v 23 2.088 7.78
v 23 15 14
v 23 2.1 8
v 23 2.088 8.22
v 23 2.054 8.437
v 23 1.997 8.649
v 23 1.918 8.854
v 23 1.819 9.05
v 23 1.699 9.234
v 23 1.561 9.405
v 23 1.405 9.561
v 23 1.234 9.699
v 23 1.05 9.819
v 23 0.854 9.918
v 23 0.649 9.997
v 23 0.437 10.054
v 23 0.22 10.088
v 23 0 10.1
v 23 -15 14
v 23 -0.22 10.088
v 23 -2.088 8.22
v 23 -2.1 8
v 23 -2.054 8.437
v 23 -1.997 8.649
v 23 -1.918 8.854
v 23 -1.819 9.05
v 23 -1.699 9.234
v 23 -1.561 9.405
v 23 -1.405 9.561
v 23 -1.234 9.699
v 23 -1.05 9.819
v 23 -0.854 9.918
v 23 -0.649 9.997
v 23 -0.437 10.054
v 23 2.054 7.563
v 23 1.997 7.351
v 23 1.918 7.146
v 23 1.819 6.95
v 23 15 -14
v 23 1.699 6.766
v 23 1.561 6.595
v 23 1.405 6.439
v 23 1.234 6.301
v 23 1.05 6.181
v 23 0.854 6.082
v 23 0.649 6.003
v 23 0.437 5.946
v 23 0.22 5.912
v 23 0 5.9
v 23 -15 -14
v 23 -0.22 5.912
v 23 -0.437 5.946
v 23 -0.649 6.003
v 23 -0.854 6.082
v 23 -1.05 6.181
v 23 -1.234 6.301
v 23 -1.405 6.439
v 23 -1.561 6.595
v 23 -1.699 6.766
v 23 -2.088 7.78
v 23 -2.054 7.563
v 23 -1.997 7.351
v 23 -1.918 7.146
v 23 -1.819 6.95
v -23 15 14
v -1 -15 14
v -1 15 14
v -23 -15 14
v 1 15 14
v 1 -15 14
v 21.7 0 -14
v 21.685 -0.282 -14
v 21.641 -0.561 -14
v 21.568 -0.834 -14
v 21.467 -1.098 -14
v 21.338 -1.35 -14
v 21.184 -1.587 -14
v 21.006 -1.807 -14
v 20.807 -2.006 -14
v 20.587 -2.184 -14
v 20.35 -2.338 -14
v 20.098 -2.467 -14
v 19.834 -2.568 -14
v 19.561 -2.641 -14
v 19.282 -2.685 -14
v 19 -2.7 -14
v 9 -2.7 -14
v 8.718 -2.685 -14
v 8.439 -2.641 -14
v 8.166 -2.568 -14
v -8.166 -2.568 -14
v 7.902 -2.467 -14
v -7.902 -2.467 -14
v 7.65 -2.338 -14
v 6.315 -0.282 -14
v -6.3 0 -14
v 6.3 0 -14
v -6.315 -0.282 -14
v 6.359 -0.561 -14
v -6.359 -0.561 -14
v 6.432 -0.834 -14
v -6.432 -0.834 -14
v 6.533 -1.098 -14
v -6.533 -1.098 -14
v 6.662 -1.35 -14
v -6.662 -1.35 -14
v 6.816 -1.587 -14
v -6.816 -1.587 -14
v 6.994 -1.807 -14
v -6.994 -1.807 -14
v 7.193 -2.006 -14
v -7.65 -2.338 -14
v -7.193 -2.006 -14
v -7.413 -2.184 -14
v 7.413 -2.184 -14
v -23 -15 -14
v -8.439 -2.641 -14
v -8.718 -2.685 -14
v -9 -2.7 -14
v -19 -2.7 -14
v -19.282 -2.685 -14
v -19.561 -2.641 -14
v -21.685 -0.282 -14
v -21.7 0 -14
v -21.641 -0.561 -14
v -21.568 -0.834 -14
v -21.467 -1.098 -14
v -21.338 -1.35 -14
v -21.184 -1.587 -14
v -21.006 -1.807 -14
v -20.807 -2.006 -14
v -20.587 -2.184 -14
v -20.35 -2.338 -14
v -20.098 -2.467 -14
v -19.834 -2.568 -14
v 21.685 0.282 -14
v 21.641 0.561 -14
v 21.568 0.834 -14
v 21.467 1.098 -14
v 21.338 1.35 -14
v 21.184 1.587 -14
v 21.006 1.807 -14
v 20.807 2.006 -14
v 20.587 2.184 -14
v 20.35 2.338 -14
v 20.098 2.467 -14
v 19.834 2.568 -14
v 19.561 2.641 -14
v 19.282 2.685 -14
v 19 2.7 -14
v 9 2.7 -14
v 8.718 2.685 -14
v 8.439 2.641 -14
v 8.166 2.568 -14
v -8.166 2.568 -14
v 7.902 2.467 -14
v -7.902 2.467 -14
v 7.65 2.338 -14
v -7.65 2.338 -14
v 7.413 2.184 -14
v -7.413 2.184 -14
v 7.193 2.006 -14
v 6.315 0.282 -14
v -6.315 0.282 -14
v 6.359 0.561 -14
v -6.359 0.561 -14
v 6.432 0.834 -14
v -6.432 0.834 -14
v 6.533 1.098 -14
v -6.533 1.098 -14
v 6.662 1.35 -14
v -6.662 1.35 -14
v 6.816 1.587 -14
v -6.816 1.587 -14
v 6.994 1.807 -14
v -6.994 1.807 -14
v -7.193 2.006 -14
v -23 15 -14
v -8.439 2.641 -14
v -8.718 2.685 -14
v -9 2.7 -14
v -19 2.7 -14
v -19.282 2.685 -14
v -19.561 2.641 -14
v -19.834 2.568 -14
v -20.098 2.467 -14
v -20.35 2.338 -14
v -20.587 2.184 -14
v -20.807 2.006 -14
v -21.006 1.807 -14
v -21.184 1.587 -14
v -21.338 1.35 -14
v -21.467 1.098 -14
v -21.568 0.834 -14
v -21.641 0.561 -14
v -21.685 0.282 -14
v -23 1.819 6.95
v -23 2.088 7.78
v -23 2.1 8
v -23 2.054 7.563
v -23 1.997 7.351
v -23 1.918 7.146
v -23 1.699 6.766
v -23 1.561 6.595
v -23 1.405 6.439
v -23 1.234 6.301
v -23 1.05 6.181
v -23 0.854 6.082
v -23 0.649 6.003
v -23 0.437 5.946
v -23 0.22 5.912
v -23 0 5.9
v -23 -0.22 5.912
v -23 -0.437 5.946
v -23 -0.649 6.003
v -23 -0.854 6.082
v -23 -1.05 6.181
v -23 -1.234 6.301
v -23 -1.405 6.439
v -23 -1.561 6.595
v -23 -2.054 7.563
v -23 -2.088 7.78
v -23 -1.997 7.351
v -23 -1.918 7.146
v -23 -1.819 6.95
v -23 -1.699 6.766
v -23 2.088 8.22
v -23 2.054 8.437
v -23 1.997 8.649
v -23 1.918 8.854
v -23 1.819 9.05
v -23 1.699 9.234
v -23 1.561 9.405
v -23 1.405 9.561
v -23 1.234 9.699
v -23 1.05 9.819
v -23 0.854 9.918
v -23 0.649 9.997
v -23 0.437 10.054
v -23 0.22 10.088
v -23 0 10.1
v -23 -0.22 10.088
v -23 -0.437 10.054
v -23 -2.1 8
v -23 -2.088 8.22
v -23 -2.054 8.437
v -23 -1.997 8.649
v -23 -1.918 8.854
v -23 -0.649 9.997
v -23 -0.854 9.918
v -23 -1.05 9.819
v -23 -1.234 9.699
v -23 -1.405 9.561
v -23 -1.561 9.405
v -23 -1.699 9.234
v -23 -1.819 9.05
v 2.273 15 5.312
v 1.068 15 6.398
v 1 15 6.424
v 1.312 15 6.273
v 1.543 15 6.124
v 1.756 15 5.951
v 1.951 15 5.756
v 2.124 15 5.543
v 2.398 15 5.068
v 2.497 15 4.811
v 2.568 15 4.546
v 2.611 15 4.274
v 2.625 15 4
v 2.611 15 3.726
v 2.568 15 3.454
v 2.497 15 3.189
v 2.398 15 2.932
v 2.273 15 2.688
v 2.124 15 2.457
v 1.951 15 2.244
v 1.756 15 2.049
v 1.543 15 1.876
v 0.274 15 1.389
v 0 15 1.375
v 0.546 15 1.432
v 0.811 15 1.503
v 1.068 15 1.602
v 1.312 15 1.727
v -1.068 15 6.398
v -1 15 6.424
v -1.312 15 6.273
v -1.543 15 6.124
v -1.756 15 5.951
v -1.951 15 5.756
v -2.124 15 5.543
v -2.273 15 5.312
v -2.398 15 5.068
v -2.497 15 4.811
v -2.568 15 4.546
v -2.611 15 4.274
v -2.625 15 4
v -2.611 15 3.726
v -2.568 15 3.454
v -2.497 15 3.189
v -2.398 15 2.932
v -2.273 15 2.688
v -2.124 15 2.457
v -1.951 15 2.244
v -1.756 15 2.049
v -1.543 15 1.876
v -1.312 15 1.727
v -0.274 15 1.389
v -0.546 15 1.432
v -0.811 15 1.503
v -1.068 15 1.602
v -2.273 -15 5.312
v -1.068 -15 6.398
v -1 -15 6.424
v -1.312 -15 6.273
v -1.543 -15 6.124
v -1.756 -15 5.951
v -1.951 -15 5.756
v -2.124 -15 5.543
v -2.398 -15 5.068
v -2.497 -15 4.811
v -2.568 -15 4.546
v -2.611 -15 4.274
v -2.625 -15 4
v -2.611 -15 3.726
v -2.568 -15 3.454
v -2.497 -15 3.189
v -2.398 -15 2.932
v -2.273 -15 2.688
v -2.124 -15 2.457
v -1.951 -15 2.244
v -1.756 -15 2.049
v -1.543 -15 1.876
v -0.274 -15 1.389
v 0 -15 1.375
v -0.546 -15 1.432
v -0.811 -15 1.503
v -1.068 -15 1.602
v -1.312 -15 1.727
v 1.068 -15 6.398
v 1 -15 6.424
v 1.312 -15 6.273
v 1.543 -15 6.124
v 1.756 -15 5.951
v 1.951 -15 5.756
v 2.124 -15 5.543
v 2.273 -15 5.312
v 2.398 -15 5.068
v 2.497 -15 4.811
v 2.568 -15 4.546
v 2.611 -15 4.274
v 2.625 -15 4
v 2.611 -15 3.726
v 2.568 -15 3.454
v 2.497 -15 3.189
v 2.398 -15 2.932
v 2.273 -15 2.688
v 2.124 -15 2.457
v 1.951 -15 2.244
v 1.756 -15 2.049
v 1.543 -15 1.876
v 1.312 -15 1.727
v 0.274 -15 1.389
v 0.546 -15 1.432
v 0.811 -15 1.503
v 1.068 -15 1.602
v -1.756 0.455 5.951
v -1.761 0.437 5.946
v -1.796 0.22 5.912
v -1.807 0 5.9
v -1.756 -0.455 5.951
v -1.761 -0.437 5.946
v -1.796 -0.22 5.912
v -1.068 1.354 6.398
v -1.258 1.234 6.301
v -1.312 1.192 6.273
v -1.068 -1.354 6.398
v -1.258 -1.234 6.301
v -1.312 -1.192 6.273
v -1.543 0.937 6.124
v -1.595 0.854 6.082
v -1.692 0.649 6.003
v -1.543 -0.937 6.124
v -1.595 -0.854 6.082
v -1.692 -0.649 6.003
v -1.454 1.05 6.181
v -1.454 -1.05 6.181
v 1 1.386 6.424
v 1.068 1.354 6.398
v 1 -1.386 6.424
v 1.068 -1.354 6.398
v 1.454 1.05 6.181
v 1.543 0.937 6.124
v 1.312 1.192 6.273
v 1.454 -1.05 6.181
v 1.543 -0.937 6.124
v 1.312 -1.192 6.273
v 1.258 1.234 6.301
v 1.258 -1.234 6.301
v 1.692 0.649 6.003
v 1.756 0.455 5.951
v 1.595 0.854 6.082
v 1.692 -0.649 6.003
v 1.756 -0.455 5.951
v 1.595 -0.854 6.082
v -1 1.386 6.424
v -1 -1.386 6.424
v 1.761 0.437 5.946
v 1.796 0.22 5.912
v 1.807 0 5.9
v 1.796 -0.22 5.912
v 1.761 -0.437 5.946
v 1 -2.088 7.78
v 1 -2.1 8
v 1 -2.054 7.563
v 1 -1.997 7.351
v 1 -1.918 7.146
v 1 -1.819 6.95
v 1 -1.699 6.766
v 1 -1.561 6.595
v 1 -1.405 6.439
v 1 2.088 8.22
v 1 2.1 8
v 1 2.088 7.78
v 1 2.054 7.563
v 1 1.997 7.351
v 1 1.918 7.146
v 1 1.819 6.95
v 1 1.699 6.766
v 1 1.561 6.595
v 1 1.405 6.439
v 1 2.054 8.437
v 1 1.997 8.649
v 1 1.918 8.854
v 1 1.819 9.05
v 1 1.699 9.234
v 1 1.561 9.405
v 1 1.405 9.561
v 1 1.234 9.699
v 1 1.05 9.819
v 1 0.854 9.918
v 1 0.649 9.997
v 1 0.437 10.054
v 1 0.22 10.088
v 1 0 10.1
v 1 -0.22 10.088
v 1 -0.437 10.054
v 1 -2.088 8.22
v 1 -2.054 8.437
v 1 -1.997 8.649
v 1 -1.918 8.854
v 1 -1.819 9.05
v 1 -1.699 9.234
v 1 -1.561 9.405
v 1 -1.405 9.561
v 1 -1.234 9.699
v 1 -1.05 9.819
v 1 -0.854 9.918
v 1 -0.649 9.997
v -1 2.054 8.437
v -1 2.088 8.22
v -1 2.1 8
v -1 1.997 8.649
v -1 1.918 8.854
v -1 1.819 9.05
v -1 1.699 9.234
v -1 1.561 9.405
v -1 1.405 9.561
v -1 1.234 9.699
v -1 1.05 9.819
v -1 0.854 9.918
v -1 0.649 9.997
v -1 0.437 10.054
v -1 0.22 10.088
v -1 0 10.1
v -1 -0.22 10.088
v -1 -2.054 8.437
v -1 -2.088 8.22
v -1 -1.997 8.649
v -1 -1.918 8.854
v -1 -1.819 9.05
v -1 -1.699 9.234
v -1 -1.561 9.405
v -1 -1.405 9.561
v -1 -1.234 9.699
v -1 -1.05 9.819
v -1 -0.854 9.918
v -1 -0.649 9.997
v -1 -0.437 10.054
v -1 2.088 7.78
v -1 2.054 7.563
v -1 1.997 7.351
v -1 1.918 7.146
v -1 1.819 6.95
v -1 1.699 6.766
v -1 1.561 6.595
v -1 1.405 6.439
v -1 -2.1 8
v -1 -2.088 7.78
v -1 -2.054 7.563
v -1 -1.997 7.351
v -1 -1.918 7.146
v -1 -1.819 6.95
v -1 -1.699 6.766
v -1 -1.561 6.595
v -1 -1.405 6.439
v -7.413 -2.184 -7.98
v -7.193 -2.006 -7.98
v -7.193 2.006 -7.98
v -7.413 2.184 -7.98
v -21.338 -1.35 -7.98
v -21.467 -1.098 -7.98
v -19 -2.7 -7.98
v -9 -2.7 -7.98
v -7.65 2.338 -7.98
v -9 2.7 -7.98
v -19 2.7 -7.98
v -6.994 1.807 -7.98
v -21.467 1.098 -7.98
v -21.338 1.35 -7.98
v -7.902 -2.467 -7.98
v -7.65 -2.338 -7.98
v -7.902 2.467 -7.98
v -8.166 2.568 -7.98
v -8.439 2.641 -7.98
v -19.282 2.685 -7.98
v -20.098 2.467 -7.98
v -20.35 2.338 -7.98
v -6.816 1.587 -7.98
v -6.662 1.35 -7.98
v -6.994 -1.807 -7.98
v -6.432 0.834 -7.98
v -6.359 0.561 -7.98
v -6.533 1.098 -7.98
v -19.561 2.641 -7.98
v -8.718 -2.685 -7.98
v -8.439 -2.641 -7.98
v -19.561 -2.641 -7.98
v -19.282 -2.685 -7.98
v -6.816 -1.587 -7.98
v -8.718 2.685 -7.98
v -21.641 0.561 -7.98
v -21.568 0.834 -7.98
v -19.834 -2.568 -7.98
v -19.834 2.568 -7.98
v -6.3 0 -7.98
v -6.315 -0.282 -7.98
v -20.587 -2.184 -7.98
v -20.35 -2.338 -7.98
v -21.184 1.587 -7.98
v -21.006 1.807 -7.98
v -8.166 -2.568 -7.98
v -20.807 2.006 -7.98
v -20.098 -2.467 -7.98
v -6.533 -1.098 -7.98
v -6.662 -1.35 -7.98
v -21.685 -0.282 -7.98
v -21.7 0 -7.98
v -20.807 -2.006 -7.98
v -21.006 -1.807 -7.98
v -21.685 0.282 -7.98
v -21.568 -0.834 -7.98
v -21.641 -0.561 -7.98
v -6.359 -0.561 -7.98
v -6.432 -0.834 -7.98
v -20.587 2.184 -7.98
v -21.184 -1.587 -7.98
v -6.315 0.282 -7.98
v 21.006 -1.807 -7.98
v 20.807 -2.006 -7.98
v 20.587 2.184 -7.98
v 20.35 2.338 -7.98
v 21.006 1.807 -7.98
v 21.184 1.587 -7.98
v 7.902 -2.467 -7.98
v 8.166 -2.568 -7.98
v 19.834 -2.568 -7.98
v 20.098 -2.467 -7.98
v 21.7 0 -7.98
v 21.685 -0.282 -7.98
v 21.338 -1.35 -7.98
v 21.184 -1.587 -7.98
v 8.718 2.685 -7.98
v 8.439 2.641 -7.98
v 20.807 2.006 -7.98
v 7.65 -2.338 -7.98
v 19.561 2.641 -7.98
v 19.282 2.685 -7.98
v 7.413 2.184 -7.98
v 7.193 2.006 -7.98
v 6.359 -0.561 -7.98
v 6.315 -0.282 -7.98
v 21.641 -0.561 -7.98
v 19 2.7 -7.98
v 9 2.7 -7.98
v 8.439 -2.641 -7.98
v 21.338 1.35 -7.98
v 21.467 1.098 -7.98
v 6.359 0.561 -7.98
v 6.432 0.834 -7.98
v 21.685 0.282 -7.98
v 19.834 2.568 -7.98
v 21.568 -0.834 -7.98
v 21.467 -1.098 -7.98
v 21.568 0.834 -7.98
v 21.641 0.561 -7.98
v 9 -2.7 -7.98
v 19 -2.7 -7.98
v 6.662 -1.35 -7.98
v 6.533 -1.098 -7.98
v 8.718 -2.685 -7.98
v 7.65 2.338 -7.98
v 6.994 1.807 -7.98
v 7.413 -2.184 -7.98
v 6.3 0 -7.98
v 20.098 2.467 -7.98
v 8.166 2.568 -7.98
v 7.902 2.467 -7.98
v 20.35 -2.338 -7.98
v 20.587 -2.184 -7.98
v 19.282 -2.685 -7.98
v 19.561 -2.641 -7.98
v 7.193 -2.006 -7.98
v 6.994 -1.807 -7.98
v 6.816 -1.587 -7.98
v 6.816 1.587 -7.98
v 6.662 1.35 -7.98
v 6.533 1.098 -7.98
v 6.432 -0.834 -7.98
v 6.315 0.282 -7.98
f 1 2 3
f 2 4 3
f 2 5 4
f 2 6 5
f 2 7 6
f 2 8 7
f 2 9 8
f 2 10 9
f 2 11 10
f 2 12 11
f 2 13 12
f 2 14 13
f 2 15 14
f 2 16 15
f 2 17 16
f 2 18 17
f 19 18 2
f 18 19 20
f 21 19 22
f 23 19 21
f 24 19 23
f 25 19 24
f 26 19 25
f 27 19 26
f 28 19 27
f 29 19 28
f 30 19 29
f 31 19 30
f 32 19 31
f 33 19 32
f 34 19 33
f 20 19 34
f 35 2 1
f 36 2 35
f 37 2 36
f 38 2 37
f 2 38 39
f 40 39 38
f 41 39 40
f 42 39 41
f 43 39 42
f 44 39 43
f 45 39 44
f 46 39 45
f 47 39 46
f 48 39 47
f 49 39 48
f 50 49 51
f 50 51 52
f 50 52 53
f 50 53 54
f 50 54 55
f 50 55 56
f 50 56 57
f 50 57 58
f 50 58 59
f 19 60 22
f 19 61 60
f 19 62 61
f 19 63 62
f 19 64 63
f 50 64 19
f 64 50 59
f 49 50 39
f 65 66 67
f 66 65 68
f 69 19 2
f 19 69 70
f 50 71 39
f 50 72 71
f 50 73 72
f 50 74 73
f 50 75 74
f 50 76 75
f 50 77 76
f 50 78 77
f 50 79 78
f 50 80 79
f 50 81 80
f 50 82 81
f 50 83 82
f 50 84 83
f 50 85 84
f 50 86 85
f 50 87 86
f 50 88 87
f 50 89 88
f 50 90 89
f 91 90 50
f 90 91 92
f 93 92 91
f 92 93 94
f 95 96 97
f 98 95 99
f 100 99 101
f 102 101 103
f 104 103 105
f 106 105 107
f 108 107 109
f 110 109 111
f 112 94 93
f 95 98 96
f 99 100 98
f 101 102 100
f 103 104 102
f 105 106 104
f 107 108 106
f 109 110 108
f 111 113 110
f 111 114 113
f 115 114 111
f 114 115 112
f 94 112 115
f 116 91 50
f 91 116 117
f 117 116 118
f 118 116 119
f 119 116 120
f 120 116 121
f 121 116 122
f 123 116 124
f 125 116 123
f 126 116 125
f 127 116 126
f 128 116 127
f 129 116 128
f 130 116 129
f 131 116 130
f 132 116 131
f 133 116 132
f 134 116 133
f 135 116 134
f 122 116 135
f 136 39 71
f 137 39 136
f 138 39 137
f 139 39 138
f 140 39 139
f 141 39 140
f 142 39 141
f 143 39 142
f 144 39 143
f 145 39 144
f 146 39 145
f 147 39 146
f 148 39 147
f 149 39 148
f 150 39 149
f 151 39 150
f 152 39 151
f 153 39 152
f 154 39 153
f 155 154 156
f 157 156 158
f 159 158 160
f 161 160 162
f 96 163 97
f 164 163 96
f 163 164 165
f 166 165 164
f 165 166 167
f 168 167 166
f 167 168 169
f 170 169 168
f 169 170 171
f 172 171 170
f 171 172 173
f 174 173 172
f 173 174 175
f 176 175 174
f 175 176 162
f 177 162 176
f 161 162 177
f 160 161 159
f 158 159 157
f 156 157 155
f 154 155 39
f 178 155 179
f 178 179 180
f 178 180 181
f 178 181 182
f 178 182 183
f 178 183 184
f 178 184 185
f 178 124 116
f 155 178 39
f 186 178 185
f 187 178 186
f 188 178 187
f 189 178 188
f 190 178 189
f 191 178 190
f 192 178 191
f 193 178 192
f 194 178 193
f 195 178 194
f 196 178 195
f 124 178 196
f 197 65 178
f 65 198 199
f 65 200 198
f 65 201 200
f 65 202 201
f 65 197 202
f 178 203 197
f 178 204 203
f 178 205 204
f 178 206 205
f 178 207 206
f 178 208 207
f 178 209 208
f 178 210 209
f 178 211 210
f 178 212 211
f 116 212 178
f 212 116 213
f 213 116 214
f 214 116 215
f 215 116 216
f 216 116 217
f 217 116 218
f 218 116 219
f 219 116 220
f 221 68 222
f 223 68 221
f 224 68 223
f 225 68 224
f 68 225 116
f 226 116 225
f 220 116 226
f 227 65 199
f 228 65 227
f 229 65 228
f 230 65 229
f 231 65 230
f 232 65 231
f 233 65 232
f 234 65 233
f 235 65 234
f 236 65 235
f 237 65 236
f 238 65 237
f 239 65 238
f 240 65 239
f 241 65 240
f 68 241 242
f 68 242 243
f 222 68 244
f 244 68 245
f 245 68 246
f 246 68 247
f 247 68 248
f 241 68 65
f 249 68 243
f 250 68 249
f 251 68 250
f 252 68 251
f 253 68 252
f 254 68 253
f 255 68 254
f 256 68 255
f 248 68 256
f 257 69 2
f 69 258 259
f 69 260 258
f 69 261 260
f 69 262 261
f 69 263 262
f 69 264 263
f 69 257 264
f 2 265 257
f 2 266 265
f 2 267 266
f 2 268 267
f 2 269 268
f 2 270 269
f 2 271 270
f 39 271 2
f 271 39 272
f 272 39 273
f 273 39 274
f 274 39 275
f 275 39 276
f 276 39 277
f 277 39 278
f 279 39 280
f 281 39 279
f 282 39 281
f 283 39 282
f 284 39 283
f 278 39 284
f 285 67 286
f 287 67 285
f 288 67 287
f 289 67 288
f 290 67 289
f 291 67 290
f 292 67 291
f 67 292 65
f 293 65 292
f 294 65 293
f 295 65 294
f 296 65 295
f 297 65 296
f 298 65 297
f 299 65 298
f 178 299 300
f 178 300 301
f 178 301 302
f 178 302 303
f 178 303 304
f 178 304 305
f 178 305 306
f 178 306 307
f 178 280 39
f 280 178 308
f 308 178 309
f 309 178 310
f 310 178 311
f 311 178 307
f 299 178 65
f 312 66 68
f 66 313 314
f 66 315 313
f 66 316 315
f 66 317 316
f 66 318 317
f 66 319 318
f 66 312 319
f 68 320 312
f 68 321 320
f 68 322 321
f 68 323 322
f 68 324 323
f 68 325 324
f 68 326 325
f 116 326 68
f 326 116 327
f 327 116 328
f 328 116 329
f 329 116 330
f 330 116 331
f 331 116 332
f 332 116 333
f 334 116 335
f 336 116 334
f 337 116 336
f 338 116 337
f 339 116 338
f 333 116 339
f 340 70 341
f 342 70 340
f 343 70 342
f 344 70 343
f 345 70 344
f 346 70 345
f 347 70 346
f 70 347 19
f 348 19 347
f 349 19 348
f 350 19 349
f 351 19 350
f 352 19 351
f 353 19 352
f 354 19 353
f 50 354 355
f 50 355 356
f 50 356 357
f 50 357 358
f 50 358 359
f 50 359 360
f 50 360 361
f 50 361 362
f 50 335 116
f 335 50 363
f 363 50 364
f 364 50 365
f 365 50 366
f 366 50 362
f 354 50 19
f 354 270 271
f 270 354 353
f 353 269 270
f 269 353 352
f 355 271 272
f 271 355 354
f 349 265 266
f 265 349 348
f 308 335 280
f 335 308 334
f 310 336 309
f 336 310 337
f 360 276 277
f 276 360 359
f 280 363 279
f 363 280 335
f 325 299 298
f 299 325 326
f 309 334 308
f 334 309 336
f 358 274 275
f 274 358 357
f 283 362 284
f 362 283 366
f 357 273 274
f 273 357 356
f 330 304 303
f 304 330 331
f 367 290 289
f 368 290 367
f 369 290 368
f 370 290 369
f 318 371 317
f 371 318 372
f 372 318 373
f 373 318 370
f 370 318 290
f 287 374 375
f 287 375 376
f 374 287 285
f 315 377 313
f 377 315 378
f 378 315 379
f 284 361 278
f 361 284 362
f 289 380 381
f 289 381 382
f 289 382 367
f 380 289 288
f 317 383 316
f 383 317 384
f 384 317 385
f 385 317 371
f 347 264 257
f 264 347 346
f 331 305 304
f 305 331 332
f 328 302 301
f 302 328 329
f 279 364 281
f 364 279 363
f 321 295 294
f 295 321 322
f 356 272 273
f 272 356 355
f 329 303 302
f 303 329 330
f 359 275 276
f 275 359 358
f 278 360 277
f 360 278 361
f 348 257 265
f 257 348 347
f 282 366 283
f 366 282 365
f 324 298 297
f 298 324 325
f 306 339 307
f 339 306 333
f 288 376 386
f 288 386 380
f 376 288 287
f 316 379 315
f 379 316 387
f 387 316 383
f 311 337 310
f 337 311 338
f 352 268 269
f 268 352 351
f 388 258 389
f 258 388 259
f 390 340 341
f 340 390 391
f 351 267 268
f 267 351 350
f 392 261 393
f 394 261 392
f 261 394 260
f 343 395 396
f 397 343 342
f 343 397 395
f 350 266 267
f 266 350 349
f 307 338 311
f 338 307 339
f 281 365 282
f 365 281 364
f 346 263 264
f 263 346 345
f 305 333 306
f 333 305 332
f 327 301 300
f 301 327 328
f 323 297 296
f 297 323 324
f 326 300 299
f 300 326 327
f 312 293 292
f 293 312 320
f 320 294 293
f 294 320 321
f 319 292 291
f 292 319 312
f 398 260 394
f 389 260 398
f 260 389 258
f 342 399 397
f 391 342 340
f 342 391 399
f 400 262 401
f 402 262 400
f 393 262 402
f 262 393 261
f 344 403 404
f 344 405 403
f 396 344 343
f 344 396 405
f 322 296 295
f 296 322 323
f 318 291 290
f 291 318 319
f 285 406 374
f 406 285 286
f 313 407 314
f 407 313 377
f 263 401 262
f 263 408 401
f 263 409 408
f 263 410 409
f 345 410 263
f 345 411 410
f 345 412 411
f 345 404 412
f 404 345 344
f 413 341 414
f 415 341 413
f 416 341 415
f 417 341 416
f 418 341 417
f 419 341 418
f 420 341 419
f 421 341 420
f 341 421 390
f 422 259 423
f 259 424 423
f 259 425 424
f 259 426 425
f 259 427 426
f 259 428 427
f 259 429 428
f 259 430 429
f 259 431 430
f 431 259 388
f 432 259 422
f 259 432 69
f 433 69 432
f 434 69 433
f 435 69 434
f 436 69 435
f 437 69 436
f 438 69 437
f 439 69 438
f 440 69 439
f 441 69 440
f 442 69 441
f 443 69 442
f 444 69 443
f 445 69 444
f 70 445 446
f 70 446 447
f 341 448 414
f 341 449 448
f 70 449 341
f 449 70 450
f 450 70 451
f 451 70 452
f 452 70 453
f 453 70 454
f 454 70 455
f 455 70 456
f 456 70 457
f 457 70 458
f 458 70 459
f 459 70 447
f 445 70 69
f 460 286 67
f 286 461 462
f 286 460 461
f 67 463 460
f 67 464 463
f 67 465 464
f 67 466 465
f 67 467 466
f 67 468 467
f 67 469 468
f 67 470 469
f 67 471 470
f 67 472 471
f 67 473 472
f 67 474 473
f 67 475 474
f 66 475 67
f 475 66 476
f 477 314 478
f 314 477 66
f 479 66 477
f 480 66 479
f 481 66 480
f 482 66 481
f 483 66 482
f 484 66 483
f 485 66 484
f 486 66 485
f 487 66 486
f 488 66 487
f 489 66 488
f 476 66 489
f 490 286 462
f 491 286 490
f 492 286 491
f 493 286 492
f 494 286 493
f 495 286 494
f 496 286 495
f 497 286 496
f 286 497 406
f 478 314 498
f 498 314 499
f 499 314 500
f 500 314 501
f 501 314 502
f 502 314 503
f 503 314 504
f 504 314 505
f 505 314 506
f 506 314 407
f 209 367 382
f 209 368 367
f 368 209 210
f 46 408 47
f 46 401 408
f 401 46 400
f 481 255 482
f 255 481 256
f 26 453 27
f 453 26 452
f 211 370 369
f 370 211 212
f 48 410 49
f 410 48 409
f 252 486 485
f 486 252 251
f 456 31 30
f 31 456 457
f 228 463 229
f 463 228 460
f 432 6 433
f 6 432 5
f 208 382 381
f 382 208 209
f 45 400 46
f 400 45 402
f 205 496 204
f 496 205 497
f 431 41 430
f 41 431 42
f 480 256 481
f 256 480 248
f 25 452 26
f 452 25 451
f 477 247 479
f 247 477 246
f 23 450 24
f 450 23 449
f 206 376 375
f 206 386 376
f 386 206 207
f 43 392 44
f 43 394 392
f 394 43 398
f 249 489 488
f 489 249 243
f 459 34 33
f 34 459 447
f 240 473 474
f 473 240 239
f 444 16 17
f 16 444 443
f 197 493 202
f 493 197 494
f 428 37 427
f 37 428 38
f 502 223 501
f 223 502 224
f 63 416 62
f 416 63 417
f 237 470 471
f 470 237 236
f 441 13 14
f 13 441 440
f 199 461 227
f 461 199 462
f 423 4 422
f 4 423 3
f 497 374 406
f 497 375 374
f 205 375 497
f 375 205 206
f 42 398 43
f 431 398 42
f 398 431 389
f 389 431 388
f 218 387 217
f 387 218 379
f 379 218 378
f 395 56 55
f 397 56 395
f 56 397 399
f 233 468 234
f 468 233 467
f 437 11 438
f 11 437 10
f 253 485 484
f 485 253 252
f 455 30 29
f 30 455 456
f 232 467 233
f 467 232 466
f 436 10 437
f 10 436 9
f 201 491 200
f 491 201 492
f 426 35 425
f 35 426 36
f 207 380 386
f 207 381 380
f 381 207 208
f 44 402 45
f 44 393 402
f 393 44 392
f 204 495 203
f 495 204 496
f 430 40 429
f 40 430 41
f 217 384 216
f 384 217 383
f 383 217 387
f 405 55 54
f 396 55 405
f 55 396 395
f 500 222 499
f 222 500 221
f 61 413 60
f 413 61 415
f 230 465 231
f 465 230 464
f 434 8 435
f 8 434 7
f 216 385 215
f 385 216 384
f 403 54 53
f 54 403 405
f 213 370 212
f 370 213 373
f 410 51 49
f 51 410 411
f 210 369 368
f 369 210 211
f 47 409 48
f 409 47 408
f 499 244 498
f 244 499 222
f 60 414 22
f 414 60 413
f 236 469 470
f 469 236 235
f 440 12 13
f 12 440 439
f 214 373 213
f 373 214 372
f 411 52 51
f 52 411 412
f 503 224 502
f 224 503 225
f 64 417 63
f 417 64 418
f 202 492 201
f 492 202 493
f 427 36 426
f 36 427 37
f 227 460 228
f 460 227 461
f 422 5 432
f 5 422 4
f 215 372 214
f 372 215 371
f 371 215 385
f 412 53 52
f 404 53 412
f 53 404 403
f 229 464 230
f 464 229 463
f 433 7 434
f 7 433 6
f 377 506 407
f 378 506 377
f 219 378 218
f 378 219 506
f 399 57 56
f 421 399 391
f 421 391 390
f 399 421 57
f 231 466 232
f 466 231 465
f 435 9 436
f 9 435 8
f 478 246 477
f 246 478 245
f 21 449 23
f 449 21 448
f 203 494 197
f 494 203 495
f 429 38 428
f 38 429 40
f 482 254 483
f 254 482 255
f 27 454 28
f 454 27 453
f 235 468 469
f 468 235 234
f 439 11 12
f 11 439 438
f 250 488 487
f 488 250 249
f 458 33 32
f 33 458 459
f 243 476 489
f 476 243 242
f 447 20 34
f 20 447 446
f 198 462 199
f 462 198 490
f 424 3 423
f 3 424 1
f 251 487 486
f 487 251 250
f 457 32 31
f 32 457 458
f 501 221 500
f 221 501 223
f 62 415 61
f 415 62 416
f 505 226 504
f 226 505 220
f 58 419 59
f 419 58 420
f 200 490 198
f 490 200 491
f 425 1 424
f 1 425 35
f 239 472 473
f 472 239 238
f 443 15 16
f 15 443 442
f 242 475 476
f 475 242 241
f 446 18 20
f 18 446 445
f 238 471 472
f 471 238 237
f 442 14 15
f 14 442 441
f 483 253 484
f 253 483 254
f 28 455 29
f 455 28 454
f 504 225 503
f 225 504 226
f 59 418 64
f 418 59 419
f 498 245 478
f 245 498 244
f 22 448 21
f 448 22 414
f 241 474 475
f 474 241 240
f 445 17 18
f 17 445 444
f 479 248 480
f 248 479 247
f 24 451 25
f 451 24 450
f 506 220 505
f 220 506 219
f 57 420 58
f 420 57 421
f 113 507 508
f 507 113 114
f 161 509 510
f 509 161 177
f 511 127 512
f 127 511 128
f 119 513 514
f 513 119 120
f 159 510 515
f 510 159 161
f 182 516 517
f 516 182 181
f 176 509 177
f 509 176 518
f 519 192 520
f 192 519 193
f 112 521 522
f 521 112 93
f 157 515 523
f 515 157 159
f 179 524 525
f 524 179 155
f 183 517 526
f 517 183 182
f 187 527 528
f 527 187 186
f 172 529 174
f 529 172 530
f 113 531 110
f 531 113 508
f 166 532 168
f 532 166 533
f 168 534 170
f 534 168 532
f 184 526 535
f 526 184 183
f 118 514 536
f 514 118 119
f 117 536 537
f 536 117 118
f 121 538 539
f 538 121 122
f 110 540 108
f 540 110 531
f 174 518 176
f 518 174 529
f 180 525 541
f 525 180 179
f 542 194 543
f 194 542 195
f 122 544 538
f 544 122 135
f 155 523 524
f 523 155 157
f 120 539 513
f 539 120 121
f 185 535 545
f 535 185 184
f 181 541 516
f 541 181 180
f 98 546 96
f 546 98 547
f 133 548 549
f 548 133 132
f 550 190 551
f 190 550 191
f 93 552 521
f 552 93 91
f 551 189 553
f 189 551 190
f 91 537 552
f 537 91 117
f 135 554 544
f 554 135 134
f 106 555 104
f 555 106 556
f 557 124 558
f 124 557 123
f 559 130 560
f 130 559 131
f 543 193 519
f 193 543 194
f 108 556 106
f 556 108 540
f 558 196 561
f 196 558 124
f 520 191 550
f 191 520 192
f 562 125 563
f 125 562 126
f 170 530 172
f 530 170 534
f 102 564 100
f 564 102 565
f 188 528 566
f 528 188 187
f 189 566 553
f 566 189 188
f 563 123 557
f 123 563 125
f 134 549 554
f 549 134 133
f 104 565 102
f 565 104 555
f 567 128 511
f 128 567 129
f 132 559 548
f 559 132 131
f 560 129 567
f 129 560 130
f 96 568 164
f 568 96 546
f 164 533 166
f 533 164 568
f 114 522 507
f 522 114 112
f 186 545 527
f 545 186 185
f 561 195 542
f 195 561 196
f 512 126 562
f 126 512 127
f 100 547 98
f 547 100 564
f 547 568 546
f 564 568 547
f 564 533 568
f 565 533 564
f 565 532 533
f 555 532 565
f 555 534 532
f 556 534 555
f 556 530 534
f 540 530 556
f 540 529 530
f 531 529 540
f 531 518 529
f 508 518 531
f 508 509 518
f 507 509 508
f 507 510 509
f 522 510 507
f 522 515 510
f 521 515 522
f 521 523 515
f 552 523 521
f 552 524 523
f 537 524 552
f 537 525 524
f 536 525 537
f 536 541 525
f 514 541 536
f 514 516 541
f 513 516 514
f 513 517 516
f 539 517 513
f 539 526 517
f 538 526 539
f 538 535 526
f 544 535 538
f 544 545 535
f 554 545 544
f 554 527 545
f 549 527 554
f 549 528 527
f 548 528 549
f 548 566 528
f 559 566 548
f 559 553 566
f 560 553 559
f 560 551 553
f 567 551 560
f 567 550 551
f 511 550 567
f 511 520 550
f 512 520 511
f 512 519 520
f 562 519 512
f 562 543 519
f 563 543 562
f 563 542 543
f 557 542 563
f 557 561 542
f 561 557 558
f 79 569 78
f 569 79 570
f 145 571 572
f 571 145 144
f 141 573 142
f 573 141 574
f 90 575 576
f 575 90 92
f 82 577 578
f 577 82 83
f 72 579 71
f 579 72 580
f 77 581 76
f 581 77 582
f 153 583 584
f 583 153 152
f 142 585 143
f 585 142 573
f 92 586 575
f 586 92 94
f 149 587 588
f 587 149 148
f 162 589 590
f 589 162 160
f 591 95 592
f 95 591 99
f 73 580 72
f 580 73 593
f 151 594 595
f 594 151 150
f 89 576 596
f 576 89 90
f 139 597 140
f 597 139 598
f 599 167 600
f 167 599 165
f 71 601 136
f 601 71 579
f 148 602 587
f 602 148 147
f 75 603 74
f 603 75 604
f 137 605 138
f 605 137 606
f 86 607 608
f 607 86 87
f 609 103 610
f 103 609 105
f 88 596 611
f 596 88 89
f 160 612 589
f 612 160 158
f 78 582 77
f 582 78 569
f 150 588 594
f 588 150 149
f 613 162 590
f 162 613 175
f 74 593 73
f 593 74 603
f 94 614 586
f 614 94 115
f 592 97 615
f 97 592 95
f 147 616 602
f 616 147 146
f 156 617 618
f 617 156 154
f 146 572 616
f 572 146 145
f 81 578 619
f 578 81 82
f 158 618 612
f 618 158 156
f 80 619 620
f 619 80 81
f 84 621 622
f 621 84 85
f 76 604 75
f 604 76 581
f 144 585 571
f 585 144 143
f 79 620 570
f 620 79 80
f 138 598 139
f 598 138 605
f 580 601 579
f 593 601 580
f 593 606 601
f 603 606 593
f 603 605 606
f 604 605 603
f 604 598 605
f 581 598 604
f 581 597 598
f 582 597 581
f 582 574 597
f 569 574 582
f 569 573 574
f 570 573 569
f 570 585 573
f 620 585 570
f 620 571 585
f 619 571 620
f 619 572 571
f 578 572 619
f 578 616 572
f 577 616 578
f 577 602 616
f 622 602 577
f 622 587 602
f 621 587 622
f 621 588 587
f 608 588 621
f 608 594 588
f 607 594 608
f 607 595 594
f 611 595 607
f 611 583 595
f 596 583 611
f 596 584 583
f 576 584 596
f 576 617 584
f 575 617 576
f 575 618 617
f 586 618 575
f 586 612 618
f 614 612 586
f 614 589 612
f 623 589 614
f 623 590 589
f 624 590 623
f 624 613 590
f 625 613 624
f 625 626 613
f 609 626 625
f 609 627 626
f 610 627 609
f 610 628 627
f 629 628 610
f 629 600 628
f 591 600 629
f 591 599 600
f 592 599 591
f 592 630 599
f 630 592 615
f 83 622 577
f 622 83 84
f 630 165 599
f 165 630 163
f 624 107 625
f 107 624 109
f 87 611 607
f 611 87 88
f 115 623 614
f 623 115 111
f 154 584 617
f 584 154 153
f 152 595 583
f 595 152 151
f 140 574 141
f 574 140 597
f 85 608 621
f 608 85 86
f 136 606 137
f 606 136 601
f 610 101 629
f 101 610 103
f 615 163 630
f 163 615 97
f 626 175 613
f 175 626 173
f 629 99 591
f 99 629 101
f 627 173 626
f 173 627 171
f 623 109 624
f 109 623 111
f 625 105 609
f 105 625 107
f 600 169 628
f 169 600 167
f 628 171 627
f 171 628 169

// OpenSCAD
// 5 mm shaft pedestal: clamp pedestal for a horizontal precision shaft.
$fn = 60;
eps = 0.02;
shaft_d = 5;
body_l = 46;
body_d = 30;
body_h = 28;
base_t = 6;
slot_w = 2;
clamp_screw_d = 4.2;
mount_d = 5.4;

module mount_slot(x) {
    hull() {
        translate([x - 5, 0, -body_h / 2 - eps]) cylinder(d = mount_d, h = base_t + 2 * eps);
        translate([x + 5, 0, -body_h / 2 - eps]) cylinder(d = mount_d, h = base_t + 2 * eps);
    }
}

difference() {
    cube([body_l, body_d, body_h], center = true);
    translate([0, -body_d / 2 - eps, 4])
        rotate([-90, 0, 0]) cylinder(d = shaft_d + 0.25, h = body_d + 2 * eps);
    // A top slit allows the M4 screw to close the shaft bore.
    translate([-slot_w / 2, -body_d / 2 - eps, 4]) cube([slot_w, body_d + 2 * eps, body_h / 2 + eps]);
    translate([-body_l / 2 - eps, 0, body_h / 2 - 6])
        rotate([0, 90, 0]) cylinder(d = clamp_screw_d, h = body_l + 2 * eps);
    mount_slot(-14);
    mount_slot(14);
}
